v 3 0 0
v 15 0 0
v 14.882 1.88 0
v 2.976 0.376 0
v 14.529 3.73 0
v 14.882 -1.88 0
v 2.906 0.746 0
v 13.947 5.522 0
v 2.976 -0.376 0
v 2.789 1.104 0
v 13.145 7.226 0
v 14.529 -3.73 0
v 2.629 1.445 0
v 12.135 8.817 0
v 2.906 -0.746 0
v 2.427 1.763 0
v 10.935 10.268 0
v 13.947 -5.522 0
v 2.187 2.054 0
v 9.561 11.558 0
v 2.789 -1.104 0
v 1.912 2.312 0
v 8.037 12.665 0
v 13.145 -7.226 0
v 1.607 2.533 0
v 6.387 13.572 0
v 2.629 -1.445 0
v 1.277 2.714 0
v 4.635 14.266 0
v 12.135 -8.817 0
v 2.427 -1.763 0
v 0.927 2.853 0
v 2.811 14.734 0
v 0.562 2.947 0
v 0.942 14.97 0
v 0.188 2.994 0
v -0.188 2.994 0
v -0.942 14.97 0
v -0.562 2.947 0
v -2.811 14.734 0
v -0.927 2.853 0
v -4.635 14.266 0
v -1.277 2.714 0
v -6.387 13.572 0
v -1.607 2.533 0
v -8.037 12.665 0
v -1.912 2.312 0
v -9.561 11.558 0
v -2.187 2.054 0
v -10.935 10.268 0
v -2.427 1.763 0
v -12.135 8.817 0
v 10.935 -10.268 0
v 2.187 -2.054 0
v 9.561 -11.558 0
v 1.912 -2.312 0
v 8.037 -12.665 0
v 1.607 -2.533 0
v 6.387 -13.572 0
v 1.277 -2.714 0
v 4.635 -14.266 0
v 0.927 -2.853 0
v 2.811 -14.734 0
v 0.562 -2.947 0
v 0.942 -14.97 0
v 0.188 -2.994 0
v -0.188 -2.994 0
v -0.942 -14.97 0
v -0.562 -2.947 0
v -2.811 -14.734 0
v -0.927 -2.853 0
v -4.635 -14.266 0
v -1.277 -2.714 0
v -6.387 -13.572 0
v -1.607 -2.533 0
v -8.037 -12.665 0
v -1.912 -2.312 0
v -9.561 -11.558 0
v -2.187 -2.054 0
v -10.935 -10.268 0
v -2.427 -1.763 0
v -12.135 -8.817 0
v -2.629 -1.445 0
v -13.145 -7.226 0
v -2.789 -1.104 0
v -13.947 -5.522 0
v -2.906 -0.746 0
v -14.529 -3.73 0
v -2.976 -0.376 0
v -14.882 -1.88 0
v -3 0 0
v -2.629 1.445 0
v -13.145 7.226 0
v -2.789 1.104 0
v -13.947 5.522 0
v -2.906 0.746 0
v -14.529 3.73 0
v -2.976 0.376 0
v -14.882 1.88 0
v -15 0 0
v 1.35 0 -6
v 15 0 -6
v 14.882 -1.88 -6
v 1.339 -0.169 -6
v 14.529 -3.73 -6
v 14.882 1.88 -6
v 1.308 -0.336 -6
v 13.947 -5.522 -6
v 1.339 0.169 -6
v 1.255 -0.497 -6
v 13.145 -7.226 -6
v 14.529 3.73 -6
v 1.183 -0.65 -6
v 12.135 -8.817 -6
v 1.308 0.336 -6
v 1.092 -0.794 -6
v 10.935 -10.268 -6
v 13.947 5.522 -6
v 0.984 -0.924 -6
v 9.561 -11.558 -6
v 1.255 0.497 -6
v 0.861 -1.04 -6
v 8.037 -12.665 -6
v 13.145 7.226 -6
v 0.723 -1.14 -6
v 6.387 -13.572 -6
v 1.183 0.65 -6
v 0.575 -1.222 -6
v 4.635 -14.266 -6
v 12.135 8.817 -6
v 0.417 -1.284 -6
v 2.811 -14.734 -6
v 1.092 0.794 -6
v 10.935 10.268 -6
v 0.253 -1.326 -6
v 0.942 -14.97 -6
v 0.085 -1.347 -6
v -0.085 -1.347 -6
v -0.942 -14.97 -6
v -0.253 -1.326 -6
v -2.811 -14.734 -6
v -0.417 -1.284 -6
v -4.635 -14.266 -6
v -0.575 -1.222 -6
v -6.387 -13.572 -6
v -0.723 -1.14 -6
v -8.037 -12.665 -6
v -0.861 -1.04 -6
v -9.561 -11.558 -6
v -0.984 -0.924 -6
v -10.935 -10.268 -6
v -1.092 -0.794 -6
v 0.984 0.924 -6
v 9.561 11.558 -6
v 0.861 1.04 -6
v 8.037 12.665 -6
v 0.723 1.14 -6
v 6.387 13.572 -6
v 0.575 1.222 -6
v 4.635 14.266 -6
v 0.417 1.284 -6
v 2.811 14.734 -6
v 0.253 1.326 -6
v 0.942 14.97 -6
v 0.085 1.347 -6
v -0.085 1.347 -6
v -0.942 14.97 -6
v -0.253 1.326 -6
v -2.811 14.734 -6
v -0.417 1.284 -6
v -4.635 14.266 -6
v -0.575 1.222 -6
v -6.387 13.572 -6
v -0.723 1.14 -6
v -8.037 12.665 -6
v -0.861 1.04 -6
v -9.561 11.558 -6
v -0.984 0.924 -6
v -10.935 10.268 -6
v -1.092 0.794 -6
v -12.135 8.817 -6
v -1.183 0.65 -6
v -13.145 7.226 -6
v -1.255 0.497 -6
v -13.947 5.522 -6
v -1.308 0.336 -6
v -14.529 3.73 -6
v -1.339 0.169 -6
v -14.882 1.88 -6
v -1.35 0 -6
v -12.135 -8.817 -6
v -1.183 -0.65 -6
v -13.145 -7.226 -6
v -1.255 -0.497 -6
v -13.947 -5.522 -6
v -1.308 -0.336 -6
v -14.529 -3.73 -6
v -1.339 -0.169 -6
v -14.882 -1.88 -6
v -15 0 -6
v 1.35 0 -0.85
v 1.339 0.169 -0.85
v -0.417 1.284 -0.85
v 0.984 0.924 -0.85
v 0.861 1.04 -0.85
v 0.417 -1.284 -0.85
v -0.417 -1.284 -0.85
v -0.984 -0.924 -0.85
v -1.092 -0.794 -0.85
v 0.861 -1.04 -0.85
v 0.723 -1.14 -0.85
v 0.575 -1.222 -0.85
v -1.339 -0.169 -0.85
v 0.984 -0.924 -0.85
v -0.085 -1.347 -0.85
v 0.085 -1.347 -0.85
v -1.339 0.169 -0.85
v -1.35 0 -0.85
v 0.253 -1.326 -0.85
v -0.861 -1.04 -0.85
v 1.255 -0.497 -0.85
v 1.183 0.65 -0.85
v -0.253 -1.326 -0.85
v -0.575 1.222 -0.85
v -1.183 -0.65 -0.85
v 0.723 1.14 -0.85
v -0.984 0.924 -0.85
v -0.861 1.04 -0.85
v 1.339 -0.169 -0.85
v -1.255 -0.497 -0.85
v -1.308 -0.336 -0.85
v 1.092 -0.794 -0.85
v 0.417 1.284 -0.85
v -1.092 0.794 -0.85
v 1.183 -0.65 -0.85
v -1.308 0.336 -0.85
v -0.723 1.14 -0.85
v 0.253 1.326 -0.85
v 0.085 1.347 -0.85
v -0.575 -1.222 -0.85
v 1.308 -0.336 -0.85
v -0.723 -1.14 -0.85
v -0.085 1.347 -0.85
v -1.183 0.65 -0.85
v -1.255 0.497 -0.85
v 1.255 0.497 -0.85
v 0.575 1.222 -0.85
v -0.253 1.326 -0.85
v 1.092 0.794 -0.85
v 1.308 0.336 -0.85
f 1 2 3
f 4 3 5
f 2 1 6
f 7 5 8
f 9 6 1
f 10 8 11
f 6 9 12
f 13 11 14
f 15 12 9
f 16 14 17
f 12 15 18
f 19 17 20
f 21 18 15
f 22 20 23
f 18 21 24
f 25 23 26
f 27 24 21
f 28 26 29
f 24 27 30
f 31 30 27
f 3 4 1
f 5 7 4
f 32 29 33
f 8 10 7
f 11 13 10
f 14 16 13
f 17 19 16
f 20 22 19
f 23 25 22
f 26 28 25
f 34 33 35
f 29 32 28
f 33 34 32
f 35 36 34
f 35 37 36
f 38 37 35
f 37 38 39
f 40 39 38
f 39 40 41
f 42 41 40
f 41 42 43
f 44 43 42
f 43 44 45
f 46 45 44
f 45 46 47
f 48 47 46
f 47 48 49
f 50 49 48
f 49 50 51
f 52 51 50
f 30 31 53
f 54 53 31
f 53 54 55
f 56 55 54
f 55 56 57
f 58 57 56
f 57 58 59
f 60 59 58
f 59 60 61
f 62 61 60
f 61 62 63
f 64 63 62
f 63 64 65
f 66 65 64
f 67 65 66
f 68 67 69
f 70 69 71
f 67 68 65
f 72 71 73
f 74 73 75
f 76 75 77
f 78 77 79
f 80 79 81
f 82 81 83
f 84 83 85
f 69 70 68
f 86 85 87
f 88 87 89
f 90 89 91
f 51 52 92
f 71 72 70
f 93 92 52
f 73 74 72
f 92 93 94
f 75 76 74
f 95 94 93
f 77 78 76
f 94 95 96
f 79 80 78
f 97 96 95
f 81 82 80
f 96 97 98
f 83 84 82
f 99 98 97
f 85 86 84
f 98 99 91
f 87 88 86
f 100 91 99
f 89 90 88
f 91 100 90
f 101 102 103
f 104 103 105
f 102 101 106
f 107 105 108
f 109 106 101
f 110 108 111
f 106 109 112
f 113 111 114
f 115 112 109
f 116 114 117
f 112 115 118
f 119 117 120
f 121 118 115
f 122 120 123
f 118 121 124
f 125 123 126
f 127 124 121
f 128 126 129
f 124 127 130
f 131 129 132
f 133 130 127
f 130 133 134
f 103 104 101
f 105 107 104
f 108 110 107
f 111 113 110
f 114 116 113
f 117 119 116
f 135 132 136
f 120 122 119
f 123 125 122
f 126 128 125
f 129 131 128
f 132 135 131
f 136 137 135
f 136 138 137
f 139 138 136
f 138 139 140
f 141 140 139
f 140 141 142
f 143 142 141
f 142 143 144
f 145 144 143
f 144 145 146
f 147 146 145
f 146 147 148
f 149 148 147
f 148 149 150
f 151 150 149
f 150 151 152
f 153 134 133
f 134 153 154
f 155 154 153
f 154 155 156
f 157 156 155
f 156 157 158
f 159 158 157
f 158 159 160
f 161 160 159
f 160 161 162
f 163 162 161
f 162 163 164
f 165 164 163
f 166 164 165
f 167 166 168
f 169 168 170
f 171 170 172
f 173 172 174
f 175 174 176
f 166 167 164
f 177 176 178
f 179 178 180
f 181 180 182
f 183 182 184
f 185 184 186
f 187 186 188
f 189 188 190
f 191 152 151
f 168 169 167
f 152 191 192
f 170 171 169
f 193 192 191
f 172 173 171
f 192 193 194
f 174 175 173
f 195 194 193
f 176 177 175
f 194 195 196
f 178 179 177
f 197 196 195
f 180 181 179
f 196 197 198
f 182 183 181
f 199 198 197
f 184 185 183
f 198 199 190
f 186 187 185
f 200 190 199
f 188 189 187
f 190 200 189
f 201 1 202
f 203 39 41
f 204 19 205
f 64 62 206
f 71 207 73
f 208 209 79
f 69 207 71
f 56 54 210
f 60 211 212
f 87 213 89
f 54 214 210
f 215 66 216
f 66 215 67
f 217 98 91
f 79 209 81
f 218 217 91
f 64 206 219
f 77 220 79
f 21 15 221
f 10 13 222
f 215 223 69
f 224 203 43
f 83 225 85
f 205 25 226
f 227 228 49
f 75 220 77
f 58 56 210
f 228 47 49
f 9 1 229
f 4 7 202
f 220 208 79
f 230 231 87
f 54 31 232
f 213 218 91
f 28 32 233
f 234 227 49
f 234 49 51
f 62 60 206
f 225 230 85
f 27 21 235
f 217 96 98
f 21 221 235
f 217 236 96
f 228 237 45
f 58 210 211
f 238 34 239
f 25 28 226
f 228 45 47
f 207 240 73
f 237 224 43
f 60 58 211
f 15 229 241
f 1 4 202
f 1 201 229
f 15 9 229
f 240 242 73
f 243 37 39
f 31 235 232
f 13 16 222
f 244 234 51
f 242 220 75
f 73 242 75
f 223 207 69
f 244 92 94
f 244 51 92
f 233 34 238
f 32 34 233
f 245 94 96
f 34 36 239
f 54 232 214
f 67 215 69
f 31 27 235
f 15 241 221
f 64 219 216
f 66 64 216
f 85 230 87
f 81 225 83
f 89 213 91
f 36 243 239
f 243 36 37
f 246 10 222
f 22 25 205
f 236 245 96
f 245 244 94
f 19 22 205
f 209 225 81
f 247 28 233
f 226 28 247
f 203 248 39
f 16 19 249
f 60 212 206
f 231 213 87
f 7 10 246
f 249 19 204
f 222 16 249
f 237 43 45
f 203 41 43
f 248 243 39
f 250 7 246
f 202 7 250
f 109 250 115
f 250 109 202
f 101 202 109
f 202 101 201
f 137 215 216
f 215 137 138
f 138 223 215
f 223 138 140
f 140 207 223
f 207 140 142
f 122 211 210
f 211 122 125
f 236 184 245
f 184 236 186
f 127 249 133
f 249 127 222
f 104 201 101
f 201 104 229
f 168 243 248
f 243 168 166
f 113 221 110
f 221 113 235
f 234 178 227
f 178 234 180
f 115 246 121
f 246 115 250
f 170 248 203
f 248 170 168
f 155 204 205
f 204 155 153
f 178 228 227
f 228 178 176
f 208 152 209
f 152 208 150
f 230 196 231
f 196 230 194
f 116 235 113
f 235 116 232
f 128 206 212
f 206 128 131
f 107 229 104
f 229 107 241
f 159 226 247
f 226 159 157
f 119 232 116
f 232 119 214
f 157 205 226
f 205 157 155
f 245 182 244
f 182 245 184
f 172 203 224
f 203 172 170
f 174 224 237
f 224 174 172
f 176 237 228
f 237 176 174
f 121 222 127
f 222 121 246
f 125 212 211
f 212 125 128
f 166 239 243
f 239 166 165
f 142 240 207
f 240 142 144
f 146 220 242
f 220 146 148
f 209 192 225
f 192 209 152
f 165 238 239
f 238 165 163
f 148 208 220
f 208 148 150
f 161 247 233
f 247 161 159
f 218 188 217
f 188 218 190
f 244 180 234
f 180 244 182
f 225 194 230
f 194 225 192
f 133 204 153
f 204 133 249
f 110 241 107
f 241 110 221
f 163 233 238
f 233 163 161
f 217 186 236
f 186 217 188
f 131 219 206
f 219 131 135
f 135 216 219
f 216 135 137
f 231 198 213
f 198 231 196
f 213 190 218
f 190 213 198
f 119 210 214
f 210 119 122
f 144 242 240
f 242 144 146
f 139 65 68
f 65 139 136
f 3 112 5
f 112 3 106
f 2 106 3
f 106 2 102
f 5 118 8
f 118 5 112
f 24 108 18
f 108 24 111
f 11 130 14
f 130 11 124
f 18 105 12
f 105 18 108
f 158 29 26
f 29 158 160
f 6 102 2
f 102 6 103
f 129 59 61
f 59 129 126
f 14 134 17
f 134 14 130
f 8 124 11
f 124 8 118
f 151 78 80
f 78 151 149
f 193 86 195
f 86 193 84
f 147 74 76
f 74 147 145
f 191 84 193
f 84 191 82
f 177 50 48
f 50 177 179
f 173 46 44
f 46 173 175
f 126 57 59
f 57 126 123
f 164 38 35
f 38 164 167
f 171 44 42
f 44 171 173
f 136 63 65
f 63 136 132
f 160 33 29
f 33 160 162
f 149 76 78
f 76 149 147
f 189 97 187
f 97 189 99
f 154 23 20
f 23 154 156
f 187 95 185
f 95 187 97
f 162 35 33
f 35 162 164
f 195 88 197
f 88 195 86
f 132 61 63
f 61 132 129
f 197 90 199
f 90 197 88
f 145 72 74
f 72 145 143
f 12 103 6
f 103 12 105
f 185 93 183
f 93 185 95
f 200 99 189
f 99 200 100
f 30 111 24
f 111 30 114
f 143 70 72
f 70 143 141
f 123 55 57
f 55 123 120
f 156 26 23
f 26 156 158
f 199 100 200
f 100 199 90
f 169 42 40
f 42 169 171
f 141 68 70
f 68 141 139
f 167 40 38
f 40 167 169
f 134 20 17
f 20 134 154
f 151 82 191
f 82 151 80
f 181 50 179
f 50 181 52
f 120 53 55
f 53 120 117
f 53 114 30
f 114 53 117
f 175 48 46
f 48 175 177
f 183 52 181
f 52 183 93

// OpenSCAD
$fn = 50;


difference() {
	union() {
		translate(v = [0, 0, -6.0000000000]) {
			cylinder(h = 6, r = 15.0000000000);
		}
	}
	union() {
		translate(v = [0, 0, 0]) {
			rotate(a = [0, 0, 0]) {
				difference() {
					union() {
						translate(v = [0, 0, -6.0000000000]) {
							cylinder(h = 6, r = 1.0000000000);
						}
						translate(v = [0, 0, -0.8500000000]) {
							cylinder(h = 0.8500000000, r1 = 1.3500000000, r2 = 3.0000000000);
						}
						translate(v = [0, 0, -6.0000000000]) {
							cylinder(h = 6, r = 1.3500000000);
						}
						translate(v = [0, 0, -6.0000000000]) {
							cylinder(h = 6, r = 1.0000000000);
						}
					}
					union();
				}
			}
		}
	}
}
